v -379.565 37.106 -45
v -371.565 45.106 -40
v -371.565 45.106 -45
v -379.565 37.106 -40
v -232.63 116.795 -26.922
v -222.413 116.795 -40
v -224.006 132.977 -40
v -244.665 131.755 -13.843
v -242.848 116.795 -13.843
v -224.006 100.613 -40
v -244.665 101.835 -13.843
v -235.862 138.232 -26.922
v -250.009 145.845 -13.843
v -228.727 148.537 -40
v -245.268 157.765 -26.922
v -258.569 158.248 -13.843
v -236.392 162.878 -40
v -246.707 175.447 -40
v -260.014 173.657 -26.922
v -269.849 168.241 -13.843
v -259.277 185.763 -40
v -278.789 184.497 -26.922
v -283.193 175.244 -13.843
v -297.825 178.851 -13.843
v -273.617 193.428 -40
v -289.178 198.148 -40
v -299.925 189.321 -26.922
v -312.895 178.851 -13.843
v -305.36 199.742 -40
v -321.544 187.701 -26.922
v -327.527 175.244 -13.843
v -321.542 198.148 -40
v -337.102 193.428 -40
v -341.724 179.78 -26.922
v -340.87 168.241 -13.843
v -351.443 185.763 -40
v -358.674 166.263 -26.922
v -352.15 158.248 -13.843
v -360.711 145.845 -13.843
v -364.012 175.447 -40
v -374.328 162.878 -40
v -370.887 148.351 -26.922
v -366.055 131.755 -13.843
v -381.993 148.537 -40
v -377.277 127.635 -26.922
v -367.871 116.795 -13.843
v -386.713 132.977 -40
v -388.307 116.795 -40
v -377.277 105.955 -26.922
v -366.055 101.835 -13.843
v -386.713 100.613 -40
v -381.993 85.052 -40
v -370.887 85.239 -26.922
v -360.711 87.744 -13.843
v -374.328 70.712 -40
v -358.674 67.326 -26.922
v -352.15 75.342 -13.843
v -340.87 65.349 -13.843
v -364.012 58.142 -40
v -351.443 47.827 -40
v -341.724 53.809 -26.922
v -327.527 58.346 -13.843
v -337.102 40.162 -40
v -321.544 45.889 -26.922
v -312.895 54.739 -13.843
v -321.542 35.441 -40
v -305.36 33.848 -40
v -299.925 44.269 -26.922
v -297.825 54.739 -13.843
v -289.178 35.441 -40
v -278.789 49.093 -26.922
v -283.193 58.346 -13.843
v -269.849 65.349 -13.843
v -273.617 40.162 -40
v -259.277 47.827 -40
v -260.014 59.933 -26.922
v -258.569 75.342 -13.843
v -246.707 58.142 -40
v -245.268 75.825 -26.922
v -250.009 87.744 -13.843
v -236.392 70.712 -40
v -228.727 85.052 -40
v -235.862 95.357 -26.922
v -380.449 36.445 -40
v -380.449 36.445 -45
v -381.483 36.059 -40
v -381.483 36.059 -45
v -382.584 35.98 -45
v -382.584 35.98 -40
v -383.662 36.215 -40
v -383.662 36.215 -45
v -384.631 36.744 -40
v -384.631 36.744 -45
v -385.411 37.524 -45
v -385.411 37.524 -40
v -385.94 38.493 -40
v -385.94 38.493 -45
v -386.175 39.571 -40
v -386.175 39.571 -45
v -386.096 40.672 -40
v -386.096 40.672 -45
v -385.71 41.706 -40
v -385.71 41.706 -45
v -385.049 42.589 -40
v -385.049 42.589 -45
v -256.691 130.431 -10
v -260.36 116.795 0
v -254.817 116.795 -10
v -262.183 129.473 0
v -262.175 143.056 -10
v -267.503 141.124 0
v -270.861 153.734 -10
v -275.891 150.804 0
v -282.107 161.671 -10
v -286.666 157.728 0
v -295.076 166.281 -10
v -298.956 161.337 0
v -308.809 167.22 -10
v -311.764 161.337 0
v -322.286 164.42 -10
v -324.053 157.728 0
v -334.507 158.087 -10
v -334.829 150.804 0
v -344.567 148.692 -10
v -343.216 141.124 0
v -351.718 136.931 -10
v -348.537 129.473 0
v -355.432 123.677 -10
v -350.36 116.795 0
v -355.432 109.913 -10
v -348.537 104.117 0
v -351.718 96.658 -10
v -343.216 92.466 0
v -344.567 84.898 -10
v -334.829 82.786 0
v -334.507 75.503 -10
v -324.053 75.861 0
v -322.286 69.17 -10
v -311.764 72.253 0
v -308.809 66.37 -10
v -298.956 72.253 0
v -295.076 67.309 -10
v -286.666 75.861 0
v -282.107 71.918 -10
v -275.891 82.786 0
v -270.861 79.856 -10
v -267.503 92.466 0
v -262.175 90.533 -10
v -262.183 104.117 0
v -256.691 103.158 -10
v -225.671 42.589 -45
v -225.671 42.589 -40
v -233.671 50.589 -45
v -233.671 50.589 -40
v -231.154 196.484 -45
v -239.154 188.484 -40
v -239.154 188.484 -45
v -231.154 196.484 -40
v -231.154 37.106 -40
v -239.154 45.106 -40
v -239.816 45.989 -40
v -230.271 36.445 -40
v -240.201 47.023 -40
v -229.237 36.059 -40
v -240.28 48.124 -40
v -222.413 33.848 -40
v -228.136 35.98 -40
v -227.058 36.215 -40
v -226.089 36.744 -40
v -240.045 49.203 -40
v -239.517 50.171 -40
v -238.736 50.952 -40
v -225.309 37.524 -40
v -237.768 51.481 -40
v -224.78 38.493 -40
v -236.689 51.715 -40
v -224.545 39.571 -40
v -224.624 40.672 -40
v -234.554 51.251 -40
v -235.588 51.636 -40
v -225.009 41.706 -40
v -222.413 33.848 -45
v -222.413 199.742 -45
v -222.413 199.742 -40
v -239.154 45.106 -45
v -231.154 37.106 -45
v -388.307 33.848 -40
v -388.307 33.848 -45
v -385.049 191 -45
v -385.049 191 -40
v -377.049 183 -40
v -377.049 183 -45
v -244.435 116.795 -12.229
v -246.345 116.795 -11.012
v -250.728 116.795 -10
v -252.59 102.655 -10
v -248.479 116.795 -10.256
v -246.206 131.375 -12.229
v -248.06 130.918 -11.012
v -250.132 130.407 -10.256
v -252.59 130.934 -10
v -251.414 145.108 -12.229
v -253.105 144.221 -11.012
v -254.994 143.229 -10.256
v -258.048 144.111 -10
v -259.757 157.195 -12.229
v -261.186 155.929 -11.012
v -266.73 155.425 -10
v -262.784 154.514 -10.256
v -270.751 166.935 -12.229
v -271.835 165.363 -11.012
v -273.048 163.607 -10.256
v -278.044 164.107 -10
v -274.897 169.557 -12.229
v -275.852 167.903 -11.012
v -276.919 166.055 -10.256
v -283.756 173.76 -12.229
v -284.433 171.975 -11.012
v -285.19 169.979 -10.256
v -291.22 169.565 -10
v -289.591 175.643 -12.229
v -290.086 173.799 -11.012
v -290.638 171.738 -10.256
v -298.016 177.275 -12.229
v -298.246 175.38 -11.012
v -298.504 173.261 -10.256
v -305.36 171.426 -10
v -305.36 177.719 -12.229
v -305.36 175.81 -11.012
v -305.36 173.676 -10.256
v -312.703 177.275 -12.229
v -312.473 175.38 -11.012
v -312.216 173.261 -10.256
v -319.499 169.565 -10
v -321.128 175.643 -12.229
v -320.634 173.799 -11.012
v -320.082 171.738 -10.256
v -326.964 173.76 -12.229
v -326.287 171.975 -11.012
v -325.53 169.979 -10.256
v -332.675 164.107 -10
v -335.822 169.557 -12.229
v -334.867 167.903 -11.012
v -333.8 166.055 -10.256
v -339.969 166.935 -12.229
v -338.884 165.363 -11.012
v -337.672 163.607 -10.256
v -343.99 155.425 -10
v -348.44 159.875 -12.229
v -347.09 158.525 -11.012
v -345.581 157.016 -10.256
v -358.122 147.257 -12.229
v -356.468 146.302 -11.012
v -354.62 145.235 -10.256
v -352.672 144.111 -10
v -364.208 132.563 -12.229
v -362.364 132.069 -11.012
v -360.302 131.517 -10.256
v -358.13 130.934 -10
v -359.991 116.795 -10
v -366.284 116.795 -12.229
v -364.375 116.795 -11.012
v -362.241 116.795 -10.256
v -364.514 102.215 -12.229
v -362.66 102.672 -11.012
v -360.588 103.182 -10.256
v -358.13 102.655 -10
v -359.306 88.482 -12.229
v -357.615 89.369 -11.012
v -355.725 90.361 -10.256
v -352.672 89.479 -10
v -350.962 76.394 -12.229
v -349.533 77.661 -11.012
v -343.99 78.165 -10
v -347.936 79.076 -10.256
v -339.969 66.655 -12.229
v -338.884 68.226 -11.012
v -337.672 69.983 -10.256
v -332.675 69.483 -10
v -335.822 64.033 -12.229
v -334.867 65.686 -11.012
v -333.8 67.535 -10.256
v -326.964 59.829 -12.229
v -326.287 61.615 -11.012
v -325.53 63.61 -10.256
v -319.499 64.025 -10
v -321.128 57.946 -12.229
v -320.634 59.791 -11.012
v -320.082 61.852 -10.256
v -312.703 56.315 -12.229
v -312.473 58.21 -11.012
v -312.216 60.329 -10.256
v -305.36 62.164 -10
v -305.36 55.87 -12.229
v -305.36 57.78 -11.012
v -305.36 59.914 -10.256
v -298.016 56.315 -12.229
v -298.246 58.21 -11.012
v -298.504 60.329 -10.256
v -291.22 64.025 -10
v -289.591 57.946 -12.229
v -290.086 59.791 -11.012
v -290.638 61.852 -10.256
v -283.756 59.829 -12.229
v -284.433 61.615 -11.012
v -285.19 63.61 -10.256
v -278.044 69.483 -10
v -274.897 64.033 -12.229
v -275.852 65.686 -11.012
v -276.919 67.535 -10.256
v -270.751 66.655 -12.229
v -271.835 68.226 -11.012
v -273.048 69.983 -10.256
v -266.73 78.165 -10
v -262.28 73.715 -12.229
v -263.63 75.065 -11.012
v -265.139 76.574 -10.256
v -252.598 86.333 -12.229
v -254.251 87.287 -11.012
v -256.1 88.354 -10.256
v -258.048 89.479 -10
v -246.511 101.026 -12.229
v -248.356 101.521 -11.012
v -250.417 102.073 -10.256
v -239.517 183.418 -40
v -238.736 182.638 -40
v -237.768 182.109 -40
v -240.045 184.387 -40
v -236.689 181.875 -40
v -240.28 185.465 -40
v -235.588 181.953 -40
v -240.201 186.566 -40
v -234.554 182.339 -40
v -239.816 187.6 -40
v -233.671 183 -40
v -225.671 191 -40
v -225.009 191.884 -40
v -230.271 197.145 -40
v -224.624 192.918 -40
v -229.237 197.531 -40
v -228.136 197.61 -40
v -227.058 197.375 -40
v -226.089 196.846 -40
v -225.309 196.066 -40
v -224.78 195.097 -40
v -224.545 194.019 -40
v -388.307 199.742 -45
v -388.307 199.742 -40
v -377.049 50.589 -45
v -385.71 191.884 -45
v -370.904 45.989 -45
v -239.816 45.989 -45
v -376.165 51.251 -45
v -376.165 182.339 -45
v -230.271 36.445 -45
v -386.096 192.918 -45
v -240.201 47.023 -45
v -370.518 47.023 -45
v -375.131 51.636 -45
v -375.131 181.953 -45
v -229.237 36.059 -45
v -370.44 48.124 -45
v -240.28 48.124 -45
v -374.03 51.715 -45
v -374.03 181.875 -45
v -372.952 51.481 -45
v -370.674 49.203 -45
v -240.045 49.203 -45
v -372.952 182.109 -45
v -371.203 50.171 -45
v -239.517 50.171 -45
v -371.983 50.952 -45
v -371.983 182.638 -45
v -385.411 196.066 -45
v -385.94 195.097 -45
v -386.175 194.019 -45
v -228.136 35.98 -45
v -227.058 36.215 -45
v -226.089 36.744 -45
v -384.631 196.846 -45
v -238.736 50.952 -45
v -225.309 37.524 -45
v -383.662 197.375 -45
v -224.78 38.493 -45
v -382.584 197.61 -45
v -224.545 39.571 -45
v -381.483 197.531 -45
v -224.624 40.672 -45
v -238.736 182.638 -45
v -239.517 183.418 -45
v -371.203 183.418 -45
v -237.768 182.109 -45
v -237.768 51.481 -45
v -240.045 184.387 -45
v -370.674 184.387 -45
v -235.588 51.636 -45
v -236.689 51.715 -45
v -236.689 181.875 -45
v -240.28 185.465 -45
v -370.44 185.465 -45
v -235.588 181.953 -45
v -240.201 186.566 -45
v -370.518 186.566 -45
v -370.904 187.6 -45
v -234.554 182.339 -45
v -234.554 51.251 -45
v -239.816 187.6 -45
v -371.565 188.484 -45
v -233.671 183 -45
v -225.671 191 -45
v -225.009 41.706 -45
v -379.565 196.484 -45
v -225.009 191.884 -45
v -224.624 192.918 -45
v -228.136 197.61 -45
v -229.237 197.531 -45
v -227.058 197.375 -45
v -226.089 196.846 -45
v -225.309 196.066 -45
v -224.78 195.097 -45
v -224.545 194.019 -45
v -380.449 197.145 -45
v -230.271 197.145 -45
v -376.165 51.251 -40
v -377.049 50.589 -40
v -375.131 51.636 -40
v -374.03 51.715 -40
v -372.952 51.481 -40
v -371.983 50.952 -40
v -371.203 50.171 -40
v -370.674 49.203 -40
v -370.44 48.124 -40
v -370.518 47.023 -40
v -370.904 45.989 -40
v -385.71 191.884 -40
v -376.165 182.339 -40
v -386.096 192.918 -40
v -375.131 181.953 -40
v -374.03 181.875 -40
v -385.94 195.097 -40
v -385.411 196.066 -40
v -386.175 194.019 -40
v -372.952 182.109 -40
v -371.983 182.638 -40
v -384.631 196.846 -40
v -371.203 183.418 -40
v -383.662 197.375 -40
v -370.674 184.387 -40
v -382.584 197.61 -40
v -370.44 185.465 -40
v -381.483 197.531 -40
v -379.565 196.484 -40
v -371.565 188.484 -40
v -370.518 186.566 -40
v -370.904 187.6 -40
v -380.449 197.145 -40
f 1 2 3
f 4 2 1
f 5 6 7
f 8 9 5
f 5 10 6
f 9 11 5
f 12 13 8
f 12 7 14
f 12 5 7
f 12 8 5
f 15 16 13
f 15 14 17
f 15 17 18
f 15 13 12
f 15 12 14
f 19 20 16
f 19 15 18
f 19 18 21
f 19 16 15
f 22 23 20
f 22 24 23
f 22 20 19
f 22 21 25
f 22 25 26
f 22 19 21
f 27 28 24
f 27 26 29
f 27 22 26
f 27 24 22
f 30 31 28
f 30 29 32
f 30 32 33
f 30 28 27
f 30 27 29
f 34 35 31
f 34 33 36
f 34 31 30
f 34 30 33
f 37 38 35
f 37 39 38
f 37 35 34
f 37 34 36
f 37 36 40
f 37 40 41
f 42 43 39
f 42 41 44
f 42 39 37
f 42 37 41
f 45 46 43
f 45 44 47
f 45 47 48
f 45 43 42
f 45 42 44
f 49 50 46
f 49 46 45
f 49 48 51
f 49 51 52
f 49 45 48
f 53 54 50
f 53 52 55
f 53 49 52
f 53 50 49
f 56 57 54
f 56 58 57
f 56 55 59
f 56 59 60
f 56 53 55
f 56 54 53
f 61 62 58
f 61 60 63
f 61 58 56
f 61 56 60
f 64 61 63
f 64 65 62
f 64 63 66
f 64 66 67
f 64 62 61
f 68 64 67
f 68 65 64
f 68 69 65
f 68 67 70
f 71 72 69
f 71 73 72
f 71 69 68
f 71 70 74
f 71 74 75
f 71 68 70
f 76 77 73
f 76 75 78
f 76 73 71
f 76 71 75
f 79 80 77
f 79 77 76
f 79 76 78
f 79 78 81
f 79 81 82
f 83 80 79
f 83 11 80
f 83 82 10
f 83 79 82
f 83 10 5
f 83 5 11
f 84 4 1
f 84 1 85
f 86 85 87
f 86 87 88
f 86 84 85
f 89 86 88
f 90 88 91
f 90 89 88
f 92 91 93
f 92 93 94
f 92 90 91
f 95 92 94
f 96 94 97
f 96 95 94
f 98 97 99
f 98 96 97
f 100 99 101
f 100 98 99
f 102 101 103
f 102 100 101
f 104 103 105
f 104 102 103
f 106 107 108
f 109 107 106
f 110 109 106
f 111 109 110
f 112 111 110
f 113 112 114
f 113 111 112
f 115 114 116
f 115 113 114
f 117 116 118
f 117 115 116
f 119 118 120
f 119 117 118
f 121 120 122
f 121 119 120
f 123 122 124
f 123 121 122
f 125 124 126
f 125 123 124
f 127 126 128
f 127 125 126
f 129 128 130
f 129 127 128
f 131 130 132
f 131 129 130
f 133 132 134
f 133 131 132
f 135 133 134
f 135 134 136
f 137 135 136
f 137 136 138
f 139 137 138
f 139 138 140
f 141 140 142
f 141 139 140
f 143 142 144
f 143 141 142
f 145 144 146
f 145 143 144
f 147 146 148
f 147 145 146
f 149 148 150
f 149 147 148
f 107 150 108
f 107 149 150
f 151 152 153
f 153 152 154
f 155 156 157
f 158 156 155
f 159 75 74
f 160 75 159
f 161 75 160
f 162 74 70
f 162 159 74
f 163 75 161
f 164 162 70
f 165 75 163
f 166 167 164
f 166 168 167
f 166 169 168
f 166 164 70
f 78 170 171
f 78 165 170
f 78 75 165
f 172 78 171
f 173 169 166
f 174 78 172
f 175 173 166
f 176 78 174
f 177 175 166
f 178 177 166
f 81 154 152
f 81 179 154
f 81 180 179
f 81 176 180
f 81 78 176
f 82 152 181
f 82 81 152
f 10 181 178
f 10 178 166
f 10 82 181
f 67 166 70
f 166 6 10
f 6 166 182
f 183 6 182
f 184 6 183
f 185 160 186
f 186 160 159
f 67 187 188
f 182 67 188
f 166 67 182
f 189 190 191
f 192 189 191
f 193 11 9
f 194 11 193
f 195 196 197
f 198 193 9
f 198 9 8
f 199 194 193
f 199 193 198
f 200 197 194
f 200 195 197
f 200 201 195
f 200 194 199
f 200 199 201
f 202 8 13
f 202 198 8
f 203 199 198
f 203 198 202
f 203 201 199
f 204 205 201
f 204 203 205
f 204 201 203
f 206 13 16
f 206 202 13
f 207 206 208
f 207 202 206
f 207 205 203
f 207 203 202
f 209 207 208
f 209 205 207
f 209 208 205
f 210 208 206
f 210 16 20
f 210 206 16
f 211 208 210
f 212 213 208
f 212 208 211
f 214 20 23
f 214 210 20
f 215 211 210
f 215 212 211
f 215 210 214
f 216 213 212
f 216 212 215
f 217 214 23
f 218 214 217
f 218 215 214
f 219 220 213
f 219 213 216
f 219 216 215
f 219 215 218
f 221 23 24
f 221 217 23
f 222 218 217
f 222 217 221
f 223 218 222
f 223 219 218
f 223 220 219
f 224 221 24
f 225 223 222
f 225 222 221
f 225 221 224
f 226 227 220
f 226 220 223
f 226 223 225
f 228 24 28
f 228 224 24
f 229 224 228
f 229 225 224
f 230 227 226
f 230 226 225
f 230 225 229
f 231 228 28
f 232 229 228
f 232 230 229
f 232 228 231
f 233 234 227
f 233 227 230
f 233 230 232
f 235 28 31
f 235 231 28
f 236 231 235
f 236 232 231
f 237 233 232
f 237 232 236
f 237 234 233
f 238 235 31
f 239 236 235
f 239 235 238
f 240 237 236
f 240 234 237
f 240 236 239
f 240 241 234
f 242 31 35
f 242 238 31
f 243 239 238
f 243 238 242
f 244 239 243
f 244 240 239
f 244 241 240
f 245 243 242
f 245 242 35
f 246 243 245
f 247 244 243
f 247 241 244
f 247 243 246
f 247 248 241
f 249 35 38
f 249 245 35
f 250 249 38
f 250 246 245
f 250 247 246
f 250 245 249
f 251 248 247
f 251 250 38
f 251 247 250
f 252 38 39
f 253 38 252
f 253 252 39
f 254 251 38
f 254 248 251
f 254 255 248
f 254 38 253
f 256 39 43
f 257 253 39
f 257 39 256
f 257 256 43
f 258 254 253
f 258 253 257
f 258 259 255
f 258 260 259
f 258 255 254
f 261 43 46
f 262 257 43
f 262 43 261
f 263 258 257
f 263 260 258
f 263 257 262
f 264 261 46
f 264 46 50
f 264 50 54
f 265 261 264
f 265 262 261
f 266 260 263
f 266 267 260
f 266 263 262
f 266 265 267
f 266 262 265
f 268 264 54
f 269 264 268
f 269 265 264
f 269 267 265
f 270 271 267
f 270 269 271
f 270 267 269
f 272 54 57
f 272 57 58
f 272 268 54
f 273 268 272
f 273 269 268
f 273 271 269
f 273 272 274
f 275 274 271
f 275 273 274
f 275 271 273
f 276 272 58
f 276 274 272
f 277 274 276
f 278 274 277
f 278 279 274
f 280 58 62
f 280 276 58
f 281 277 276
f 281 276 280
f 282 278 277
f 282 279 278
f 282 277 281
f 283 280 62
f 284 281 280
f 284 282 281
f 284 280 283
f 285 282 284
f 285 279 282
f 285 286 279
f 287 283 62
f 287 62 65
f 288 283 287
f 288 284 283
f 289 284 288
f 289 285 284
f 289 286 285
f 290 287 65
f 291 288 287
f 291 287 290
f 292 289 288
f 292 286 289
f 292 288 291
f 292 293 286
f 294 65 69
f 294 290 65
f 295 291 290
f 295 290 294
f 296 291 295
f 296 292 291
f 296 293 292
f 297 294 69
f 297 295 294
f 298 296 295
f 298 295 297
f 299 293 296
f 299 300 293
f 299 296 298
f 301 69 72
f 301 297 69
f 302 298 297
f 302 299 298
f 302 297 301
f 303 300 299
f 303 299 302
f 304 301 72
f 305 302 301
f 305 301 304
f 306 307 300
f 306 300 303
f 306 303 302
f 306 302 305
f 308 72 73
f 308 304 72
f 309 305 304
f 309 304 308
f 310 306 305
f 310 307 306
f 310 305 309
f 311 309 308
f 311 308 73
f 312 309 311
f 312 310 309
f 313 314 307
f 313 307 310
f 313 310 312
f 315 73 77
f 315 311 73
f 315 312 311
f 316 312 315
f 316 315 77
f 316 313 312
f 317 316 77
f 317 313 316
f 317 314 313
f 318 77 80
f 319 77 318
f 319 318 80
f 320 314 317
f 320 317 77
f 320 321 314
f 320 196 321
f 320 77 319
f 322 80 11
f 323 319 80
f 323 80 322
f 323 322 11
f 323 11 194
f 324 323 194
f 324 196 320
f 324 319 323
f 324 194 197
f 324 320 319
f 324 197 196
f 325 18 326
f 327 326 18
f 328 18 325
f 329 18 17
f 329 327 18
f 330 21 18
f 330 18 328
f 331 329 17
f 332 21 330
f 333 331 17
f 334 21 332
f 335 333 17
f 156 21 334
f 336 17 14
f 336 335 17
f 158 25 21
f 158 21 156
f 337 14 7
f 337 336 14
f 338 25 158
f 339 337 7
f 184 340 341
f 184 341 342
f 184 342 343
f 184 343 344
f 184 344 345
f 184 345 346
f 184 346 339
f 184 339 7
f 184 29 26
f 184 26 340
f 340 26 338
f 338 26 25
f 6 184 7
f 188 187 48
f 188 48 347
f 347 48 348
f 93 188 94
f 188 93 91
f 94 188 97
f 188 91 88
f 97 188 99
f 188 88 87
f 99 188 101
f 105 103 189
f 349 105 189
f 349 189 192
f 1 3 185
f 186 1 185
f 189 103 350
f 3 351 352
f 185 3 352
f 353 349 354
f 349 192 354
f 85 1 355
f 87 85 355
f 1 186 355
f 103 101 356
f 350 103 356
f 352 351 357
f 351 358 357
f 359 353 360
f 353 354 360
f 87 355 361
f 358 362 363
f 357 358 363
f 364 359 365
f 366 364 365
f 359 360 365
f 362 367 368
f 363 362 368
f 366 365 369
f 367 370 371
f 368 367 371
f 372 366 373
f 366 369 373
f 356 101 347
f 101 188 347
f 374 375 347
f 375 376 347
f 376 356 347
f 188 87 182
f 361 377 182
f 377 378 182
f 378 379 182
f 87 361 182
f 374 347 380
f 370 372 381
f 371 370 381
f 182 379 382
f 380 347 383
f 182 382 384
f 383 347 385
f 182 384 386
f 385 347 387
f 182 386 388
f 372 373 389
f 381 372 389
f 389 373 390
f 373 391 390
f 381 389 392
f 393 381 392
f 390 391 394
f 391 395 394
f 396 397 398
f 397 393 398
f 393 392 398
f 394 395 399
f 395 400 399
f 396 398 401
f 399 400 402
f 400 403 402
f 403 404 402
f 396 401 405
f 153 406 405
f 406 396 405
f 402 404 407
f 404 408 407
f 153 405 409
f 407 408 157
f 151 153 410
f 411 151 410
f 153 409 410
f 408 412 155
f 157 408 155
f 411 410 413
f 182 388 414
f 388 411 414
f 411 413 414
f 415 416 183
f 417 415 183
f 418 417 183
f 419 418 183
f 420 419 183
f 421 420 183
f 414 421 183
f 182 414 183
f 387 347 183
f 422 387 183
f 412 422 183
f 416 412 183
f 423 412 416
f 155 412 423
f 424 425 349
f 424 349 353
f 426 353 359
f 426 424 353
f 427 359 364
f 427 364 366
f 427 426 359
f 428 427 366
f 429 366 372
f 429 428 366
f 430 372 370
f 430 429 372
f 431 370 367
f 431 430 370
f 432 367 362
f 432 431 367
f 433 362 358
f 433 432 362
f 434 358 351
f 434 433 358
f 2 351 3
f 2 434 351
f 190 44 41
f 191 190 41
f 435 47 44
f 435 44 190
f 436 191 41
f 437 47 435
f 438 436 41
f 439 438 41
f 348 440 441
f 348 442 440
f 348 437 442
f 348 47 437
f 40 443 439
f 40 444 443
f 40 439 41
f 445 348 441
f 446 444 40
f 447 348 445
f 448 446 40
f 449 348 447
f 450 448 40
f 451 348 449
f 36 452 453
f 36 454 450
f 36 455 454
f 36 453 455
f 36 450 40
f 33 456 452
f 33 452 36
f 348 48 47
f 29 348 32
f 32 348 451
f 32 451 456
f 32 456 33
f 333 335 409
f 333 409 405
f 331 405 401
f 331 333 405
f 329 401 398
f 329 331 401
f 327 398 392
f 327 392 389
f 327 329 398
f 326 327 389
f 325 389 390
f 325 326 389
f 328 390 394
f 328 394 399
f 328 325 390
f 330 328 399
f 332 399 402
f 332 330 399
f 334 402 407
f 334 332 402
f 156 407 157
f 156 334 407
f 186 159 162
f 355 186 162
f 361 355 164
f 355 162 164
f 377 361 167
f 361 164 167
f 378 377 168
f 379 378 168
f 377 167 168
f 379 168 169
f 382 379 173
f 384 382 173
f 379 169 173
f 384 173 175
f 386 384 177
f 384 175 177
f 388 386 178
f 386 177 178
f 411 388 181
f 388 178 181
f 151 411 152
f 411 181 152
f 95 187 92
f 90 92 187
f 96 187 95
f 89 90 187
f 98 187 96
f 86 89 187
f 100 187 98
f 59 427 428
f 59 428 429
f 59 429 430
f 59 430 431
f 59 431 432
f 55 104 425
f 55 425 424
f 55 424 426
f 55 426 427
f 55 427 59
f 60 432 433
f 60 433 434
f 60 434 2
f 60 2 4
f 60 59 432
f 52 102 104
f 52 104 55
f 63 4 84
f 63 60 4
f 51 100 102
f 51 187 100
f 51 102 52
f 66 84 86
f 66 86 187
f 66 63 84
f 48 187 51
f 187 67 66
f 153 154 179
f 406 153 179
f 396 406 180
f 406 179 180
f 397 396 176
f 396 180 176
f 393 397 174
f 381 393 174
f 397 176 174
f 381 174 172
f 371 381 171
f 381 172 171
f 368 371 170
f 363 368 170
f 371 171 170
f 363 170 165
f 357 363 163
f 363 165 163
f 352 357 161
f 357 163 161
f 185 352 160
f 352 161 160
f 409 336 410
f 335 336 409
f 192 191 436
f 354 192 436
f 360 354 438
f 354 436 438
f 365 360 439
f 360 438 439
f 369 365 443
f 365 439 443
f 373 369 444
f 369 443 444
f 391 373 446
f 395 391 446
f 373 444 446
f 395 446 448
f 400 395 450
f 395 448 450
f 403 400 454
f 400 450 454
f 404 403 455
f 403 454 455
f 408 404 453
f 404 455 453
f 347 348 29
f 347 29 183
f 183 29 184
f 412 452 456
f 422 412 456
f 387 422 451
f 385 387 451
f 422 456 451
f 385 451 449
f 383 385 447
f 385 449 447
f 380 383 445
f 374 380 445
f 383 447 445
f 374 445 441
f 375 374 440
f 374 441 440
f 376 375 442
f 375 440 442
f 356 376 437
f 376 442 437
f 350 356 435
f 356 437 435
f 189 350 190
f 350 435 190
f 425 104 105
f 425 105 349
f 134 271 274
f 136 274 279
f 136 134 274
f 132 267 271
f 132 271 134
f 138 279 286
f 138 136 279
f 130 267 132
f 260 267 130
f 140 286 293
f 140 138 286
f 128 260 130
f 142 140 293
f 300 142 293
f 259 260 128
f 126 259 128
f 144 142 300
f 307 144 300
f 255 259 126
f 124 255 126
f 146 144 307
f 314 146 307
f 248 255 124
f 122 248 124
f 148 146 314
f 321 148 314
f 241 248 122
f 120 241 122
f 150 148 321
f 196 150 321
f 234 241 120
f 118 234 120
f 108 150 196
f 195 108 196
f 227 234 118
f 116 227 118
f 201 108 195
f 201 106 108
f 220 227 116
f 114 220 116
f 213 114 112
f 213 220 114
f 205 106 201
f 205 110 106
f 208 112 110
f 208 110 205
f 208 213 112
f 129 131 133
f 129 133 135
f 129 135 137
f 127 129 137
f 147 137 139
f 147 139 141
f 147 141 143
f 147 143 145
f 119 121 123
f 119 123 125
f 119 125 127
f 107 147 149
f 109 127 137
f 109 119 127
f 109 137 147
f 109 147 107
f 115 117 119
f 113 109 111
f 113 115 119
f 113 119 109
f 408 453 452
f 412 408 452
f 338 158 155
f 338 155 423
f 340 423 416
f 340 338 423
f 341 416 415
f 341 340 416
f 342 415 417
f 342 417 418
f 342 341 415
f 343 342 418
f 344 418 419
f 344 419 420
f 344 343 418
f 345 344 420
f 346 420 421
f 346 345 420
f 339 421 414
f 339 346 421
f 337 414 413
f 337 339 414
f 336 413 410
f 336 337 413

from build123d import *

# Parameters (mm, degrees)
SKETCH4_R           = 45
BOSS_EXTRUDE1_DEPTH = 10
BOSS_EXTRUDE1_DRAFT = 29
SKETCH7_R           = 59.508676161
BOSS_EXTRUDE2_DEPTH = 30
BOSS_EXTRUDE2_DRAFT = 38
FILLET1_R           = 10
SKETCH9_W           = 165.894489912
SKETCH9_H           = 165.894489912
BOSS_EXTRUDE3_DEPTH = 5


with BuildPart() as part:
    # Sketch4 → Boss-Extrude1 (with draft: the straight prism first)
    with BuildSketch(Plane.XY):
        with Locations((-305.359774759, 116.794851209)):
            Circle(SKETCH4_R)
    extrude(amount=-BOSS_EXTRUDE1_DEPTH)
    # Boss-Extrude1: the draft: its side faces are tilted about the plane it starts from
    boss_extrude1_sides = [part.faces().sort_by_distance(p)[0] for p in [
        (-350.359774759, 116.794851209, -5),
    ]]
    draft(boss_extrude1_sides, Plane.XY, BOSS_EXTRUDE1_DRAFT)


with BuildPart() as boss_extrude2_tool:
    # Sketch7 → Boss-Extrude2 (with draft: the straight prism first)
    with BuildSketch(Plane.XY.offset(-10)):
        with Locations((-305.359774759, 116.794851209)):
            Circle(SKETCH7_R)
    extrude(amount=-BOSS_EXTRUDE2_DEPTH)
    # Boss-Extrude2: the draft: its side faces are tilted about the plane it starts from
    boss_extrude2_sides = [boss_extrude2_tool.faces().sort_by_distance(p)[0] for p in [
        (-364.868450919, 116.794851209, -25),
    ]]
    draft(boss_extrude2_sides, Plane.XY.offset(-10), BOSS_EXTRUDE2_DRAFT)


with BuildPart() as part_1:
    add(part.part)

    # Boss-Extrude2: add boss_extrude2_tool
    add(boss_extrude2_tool.part)

    # Fillet1
    fillet1_edges = [part_1.edges().sort_by_distance(p)[0] for p in [
        (-364.868450919, 116.794851209, -10),
    ]]
    fillet(fillet1_edges, radius=FILLET1_R)

    # Sketch9 → Boss-Extrude3 (add)
    with BuildSketch(Plane.XY.offset(-40)):
        with Locations((-305.359774759, 116.794851209)):
            Rectangle(SKETCH9_W, SKETCH9_H)
        with BuildLine():
            Line((-225.670814758, 191.00038112), (-233.670814758, 183.00038112))
            ThreePointArc((-233.670814758, 183.00038112), (-239.154244847, 183.00038112), (-239.154244847, 188.48381121))
            Line((-239.154244847, 188.48381121), (-231.154244847, 196.48381121))
            ThreePointArc((-231.154244847, 196.48381121), (-225.670814758, 196.48381121), (-225.670814758, 191.00038112))
        make_face(mode=Mode.SUBTRACT)
        with BuildLine():
            Line((-385.048734759, 191.00038112), (-377.048734759, 183.00038112))
            ThreePointArc((-377.048734759, 183.00038112), (-371.56530467, 183.00038112), (-371.56530467, 188.48381121))
            Line((-371.56530467, 188.48381121), (-379.56530467, 196.48381121))
            ThreePointArc((-379.56530467, 196.48381121), (-385.048734759, 196.48381121), (-385.048734759, 191.00038112))
        make_face(mode=Mode.SUBTRACT)
        with BuildLine():
            Line((-385.048734759, 42.589321298), (-377.048734759, 50.589321298))
            ThreePointArc((-377.048734759, 50.589321298), (-371.56530467, 50.589321298), (-371.56530467, 45.105891208))
            Line((-371.56530467, 45.105891208), (-379.56530467, 37.105891208))
            ThreePointArc((-379.56530467, 37.105891208), (-385.048734759, 37.105891208), (-385.048734759, 42.589321298))
        make_face(mode=Mode.SUBTRACT)
        with BuildLine():
            Line((-225.670814758, 42.589321298), (-233.670814758, 50.589321298))
            ThreePointArc((-233.670814758, 50.589321298), (-239.154244847, 50.589321298), (-239.154244847, 45.105891208))
            Line((-239.154244847, 45.105891208), (-231.154244847, 37.105891208))
            ThreePointArc((-231.154244847, 37.105891208), (-225.670814758, 37.105891208), (-225.670814758, 42.589321298))
        make_face(mode=Mode.SUBTRACT)
    extrude(amount=-BOSS_EXTRUDE3_DEPTH)


solid = part_1.part
